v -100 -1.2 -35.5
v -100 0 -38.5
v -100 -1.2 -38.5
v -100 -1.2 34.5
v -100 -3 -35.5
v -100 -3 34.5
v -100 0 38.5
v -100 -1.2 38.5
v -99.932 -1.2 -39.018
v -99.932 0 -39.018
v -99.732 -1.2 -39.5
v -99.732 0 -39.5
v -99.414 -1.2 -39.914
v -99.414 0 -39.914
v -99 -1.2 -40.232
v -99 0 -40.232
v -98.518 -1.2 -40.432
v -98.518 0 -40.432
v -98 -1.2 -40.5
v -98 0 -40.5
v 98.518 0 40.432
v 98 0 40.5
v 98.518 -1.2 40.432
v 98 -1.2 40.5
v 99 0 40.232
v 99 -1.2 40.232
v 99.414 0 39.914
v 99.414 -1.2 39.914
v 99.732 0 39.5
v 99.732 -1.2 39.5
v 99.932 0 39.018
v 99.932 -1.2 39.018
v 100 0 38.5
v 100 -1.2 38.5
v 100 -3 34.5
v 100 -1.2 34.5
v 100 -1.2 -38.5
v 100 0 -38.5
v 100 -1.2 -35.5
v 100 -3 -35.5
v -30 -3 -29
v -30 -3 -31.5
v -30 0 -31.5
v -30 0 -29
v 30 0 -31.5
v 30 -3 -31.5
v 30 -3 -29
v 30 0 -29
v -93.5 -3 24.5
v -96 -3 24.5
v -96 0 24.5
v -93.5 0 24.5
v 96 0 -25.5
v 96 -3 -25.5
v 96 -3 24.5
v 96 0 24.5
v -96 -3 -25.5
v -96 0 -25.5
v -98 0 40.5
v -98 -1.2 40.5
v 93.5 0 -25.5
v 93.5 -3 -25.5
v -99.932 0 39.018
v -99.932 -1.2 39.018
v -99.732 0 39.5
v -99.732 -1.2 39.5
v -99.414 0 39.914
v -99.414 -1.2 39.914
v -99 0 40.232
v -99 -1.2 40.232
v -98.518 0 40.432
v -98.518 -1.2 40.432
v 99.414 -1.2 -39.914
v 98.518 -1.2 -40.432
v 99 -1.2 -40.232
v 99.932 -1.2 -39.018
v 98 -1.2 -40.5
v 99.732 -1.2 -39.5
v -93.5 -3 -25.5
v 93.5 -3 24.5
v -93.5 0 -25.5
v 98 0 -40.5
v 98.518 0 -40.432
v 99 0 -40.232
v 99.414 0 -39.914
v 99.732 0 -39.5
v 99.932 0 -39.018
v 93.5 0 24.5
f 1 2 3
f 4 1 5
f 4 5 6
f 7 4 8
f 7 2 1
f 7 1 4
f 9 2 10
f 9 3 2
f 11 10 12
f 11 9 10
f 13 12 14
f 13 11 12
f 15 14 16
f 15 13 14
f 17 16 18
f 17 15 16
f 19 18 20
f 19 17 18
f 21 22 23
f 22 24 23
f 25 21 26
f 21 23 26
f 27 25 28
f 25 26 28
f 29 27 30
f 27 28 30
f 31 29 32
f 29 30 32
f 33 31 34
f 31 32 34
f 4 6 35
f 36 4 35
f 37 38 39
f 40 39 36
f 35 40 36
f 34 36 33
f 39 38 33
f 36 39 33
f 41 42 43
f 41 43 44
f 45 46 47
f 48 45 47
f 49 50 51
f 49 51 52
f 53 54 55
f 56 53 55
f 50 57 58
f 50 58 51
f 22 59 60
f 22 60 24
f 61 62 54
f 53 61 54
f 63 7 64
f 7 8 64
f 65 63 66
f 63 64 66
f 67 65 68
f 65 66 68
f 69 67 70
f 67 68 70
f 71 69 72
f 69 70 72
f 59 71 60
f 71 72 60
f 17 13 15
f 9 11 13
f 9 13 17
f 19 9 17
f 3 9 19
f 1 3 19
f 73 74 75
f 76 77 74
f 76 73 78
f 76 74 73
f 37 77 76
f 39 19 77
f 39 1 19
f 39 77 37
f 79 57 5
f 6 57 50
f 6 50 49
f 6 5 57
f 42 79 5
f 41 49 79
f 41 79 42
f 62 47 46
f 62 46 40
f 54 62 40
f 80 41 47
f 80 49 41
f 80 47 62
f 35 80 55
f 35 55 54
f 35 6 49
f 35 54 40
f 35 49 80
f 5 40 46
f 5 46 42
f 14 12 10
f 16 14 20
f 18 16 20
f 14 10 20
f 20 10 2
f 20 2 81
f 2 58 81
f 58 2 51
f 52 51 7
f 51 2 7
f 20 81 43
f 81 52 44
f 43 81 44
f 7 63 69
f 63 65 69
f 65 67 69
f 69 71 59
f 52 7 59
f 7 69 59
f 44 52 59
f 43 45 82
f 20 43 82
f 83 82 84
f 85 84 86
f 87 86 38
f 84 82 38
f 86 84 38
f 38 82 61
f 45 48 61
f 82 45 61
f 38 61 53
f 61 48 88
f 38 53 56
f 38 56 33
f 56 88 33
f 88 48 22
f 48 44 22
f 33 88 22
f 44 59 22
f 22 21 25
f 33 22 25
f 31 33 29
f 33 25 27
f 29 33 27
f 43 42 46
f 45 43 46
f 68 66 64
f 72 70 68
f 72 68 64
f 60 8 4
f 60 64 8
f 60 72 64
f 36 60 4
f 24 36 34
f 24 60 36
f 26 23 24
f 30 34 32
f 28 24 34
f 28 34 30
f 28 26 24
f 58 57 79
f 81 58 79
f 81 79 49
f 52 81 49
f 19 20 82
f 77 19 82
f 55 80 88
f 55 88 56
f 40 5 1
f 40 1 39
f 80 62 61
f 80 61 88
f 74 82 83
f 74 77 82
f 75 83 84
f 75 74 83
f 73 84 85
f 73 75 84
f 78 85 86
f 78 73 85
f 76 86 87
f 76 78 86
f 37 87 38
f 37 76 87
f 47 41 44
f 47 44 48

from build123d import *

# Parameters (mm, degrees)
F0_W     = 200
F0_H     = 81
F1_DEPTH = 3
F2_W     = 200
F2_H     = 6
F2_H_2   = 5
F3_DEPTH = 1.8
F4_R     = 2
F5_W     = 2.5
F5_H     = 50
F5_W_2   = 60
F5_H_2   = 2.5
F6_DEPTH = 25


with BuildPart() as f1:
    # F0 (on Front) → F1 (new body)
    with BuildSketch(Plane.XZ):
        Rectangle(F0_W, F0_H)
    extrude(amount=F1_DEPTH)

    # F2 (on face) → F3 (cut)
    with BuildSketch(Plane.XZ.offset(3)):
        with Locations((0, 37.5)):
            Rectangle(F2_W, F2_H)
        with Locations((0, -38)):
            Rectangle(F2_W, F2_H_2)
    extrude(amount=-F3_DEPTH, mode=Mode.SUBTRACT)

    # F4
    f4_edges = [f1.edges().sort_by_distance(p)[0] for p in [
        (-100, -0.6, -40.5),
        (-100, -0.6, 40.5),
        (100, -0.6, -40.5),
        (100, -0.6, 40.5),
    ]]
    fillet(f4_edges, radius=F4_R)

    # F5 (on face) → F6 (cut)
    with BuildSketch(Plane.XZ.offset(3)):
        with Locations((-94.75, -0.5)):
            Rectangle(F5_W, F5_H)
        with Locations((94.75, -0.5)):
            Rectangle(F5_W, F5_H)
        with Locations((0, -30.25)):
            Rectangle(F5_W_2, F5_H_2)
    extrude(amount=-F6_DEPTH, mode=Mode.SUBTRACT)


solid = f1.part
